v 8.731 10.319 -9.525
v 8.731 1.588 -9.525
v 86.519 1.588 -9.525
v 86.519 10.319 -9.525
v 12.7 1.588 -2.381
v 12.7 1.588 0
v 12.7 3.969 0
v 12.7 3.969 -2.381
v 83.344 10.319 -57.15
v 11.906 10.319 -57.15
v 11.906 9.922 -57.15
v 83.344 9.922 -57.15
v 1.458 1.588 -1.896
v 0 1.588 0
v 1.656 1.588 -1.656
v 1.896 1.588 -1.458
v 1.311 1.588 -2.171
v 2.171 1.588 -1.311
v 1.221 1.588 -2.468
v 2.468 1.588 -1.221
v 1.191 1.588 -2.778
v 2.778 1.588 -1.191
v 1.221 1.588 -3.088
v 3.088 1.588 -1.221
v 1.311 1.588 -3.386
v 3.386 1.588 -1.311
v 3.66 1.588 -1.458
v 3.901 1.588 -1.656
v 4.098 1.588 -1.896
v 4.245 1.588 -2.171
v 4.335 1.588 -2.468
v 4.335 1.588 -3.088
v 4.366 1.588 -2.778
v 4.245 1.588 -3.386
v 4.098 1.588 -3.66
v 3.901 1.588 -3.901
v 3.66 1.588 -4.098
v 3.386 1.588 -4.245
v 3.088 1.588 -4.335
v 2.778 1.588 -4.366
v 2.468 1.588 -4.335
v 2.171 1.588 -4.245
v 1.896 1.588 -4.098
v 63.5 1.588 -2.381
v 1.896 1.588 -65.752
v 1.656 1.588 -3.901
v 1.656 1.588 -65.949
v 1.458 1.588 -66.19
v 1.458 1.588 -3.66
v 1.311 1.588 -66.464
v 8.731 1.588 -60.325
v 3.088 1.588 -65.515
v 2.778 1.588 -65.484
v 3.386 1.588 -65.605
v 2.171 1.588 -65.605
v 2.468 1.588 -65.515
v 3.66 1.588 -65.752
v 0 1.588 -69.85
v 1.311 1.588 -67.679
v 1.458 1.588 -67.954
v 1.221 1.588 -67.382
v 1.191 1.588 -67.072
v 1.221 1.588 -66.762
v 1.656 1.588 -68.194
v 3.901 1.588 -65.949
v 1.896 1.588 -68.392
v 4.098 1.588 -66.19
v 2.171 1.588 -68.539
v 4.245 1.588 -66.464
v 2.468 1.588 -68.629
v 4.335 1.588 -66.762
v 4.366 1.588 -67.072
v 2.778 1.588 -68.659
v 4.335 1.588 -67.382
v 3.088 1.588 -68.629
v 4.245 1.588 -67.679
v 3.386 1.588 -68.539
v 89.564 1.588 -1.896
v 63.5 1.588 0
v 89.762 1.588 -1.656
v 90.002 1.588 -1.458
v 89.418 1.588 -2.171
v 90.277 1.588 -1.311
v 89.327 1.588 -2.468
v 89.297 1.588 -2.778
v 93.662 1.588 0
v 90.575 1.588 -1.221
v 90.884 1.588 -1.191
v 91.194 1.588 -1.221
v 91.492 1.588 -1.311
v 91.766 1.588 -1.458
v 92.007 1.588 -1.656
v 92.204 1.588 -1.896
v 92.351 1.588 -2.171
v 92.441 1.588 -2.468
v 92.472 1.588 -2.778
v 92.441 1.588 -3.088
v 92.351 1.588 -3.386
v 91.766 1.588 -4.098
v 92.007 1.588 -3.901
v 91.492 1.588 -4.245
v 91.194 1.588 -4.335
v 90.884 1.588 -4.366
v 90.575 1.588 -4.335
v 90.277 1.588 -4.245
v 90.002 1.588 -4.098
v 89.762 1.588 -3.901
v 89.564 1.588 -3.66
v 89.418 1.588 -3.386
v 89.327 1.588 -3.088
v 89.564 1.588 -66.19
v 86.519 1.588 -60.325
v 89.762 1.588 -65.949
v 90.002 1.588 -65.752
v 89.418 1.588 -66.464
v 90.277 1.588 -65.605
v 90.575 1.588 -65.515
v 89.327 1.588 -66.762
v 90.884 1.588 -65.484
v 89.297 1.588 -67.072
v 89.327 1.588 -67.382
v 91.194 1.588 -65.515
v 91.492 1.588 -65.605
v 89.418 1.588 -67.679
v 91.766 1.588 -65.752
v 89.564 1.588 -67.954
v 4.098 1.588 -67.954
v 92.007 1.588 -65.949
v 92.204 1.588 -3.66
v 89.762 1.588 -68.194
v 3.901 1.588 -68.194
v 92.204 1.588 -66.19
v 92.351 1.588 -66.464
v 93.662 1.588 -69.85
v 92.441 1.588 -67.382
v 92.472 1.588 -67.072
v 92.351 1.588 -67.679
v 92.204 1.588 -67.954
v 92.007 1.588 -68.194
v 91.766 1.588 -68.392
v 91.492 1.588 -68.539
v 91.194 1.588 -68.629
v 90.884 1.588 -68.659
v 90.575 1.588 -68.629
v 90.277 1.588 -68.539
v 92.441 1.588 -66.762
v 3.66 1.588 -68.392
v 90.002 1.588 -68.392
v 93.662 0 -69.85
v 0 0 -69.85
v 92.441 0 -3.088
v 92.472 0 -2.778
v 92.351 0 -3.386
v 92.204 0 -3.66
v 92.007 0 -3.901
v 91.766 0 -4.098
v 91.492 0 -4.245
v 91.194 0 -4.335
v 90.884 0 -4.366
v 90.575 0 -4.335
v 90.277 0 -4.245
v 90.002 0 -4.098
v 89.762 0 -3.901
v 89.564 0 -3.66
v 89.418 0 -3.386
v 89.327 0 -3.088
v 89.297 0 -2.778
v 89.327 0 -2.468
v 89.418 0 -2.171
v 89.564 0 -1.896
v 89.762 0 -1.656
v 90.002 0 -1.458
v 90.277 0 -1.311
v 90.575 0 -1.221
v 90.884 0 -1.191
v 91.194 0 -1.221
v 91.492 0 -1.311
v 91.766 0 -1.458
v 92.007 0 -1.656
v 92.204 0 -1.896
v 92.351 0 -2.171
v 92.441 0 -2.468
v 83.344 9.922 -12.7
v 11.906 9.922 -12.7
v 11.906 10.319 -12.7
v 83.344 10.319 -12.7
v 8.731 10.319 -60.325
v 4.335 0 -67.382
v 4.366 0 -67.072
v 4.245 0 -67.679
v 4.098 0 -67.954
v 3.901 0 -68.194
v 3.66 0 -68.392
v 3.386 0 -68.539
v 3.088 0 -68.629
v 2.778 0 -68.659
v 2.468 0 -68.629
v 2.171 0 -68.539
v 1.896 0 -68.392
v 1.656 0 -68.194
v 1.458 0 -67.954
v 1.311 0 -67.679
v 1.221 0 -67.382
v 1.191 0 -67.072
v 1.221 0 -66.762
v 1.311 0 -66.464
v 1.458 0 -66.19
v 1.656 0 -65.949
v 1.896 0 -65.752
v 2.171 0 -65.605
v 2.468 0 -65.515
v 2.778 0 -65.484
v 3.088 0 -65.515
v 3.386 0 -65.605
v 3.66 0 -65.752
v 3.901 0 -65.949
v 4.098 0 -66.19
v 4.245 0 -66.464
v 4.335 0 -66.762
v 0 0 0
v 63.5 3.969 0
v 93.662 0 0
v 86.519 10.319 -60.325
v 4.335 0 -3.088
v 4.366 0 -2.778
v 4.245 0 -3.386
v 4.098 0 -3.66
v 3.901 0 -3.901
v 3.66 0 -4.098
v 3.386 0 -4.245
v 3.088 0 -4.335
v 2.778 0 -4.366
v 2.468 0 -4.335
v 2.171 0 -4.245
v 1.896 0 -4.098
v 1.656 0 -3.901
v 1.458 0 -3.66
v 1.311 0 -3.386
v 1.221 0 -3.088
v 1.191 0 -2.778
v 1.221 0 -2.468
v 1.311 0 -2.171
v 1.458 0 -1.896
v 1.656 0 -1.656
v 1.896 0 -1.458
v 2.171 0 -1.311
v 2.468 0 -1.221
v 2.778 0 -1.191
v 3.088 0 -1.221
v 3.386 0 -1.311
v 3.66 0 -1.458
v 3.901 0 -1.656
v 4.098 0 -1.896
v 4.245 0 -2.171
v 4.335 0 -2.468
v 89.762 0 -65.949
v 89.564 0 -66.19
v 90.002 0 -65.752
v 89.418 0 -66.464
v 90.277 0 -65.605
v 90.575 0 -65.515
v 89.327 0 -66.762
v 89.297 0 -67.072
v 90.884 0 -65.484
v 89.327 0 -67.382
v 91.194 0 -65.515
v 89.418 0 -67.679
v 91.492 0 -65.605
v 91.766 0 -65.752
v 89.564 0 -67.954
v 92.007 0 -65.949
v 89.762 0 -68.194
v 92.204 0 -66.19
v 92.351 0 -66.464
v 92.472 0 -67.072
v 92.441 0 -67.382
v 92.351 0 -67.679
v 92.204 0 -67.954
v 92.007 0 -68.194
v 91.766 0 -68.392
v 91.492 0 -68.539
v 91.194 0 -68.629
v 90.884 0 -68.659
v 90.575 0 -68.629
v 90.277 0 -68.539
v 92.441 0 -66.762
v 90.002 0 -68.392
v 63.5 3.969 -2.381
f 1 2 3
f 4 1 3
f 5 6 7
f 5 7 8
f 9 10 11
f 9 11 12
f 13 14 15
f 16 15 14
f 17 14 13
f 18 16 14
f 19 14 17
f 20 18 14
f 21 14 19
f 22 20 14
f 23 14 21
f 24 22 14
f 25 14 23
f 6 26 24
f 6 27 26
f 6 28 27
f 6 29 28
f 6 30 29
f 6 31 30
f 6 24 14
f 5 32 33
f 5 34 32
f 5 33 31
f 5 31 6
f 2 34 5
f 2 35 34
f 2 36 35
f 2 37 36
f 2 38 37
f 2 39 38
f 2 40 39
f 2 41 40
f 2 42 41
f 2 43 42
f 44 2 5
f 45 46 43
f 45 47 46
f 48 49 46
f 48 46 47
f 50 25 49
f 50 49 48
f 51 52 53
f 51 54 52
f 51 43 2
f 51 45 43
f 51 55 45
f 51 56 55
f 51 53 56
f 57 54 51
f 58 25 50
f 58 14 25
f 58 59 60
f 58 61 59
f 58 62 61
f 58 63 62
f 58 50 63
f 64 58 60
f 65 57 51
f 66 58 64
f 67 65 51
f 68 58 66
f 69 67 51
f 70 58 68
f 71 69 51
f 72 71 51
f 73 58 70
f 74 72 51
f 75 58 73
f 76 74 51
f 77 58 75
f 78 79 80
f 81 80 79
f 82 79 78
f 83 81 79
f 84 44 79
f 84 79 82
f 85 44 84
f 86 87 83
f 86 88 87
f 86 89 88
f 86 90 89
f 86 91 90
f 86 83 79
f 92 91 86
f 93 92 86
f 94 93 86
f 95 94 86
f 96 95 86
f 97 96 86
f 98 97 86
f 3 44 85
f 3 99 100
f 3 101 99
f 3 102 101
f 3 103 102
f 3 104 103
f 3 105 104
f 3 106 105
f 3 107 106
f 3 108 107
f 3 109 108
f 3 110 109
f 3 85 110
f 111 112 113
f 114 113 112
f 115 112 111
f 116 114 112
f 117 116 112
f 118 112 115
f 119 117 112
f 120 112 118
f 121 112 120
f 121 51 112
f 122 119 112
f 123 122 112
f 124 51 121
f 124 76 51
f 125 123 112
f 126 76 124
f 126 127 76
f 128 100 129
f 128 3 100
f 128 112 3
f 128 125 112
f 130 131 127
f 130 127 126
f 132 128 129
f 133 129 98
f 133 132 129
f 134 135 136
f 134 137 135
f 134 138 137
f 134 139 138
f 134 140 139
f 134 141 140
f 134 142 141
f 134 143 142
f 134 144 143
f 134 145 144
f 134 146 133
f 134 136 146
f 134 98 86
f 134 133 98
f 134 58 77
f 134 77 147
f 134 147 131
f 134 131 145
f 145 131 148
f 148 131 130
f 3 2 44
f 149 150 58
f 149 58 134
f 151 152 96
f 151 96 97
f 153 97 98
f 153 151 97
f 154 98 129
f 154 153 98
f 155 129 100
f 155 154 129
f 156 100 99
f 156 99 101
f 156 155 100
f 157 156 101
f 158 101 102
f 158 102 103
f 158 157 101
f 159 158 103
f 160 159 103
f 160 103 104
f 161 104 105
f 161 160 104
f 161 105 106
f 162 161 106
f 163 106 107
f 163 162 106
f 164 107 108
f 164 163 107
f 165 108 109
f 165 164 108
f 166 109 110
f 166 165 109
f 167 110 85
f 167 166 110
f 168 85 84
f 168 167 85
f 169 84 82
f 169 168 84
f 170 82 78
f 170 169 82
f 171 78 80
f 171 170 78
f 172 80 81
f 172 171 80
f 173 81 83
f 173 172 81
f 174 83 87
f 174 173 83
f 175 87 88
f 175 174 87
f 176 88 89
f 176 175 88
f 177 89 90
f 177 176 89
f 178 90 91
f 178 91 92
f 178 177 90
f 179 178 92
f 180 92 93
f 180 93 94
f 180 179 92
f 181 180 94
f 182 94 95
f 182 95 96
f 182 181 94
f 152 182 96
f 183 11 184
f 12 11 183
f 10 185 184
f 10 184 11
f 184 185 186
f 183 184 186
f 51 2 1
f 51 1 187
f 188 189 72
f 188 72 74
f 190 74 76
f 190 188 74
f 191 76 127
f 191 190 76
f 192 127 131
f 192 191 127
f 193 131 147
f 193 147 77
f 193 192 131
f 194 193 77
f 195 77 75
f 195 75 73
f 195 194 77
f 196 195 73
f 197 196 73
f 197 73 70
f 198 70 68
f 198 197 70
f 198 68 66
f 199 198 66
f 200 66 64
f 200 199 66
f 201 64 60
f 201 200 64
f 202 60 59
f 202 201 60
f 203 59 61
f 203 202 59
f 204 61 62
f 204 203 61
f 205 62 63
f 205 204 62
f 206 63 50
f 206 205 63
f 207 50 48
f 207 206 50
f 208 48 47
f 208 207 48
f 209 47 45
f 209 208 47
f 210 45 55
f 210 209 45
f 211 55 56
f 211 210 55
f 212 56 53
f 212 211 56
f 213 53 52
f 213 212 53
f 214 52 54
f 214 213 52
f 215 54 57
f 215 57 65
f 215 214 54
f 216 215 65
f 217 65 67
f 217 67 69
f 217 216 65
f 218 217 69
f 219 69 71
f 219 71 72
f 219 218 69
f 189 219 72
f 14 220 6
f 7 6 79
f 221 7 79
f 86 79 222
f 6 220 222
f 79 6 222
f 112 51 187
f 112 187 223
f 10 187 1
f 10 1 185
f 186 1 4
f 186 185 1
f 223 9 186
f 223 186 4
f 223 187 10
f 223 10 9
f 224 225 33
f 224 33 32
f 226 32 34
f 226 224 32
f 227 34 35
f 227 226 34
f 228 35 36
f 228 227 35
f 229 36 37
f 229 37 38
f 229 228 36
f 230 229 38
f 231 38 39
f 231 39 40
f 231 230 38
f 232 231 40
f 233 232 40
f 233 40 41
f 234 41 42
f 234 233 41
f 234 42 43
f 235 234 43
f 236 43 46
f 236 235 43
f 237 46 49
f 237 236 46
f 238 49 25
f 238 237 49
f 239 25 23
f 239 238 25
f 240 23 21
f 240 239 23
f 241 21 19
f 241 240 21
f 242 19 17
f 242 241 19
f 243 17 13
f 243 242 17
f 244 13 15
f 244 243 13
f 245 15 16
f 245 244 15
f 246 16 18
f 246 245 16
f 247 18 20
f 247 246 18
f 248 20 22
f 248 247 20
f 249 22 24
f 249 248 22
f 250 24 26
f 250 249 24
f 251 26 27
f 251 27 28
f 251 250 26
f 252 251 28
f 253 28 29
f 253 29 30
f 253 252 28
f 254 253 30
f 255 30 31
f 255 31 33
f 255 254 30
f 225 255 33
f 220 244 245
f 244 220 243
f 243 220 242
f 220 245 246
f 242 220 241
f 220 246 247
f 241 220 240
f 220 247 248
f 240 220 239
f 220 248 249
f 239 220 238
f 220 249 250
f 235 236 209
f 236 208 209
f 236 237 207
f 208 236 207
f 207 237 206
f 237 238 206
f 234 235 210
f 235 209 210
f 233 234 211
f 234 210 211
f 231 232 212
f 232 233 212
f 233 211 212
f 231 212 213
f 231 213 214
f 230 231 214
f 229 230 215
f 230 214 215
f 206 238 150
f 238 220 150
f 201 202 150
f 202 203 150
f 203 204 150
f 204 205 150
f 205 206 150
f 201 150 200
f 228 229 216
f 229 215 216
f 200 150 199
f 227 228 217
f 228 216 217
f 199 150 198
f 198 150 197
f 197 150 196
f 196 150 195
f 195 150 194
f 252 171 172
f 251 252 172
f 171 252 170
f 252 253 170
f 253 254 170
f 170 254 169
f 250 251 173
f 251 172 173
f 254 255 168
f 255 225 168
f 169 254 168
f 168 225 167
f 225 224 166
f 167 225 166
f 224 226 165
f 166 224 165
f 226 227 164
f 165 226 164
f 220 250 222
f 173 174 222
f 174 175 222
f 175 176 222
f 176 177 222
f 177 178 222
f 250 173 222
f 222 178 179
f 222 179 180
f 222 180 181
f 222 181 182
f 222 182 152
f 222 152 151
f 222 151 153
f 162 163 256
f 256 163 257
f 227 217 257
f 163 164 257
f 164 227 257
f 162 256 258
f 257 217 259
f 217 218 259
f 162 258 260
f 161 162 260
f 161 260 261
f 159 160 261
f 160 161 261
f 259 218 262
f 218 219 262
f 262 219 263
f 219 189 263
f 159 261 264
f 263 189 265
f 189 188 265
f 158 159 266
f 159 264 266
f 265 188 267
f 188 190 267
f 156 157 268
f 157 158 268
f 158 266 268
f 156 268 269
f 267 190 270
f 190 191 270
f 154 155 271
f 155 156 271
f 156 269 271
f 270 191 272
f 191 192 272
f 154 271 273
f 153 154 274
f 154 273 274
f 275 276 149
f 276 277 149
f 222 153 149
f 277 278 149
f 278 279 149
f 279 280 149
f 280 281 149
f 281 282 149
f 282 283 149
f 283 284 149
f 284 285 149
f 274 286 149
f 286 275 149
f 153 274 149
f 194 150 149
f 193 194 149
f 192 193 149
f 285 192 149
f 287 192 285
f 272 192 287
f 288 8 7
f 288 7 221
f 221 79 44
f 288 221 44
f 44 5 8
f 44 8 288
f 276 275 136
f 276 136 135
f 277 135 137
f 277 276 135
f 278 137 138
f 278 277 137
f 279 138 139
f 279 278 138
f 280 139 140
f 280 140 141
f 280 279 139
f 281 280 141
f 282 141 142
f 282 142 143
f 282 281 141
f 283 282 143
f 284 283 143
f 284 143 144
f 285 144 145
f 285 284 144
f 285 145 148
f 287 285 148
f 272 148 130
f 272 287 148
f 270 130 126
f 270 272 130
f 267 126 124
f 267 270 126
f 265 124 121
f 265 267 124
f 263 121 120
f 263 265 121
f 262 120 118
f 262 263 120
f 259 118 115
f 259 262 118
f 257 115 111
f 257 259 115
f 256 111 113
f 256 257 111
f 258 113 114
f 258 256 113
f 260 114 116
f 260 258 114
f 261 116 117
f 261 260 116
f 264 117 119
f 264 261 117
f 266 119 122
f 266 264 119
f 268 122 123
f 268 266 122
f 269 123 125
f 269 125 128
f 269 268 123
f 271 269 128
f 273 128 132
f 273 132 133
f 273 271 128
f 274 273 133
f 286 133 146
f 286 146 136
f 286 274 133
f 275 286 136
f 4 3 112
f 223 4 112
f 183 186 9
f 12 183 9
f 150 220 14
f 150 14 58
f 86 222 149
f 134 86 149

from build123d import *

# Parameters (mm, degrees)
SKETCH1_W           = 93.6625
SKETCH1_H           = 69.85
SKETCH1_R           = 1.5875
BOSS_EXTRUDE1_DEPTH = 1.5875
SKETCH2_W           = 77.7875
SKETCH2_H           = 50.8
BOSS_EXTRUDE2_DEPTH = 8.73125
SKETCH3_W           = 50.8
SKETCH3_H           = 2.38125
BOSS_EXTRUDE3_DEPTH = 2.38125
SKETCH4_W           = 71.4375
SKETCH4_H           = 44.45
CUT_EXTRUDE1_DEPTH  = 0.396875


with BuildPart() as part:
    # Sketch1 → Boss-Extrude1 (new body)
    with BuildSketch(Plane(origin=(0, 0, 0), x_dir=(1, 0, 0), z_dir=(0, 1, 0))):
        with Locations((46.83125, 34.925)):
            Rectangle(SKETCH1_W, SKETCH1_H)
        with Locations((2.778125, 67.071875)):
            Circle(SKETCH1_R, mode=Mode.SUBTRACT)
        with Locations((90.884375, 67.071875)):
            Circle(SKETCH1_R, mode=Mode.SUBTRACT)
        with Locations((2.778125, 2.778125)):
            Circle(SKETCH1_R, mode=Mode.SUBTRACT)
        with Locations((90.884375, 2.778125)):
            Circle(SKETCH1_R, mode=Mode.SUBTRACT)
    extrude(amount=BOSS_EXTRUDE1_DEPTH)

    # Sketch2 → Boss-Extrude2 (add)
    with BuildSketch(Plane(origin=(0, 1.5875, 0), x_dir=(1, 0, 0), z_dir=(0, 1, 0))):
        with Locations((47.625, 34.925)):
            Rectangle(SKETCH2_W, SKETCH2_H)
    extrude(amount=BOSS_EXTRUDE2_DEPTH)

    # Sketch3 → Boss-Extrude3 (add)
    with BuildSketch(Plane(origin=(0, 1.5875, 0), x_dir=(1, 0, 0), z_dir=(0, 1, 0))):
        with Locations((38.1, 1.190625)):
            Rectangle(SKETCH3_W, SKETCH3_H)
    extrude(amount=BOSS_EXTRUDE3_DEPTH)

    # Sketch4 → Cut-Extrude1 (cut)
    with BuildSketch(Plane(origin=(0, 10.31875, 0), x_dir=(1, 0, 0), z_dir=(0, 1, 0))):
        with Locations((47.625, 34.925)):
            Rectangle(SKETCH4_W, SKETCH4_H)
    extrude(amount=-CUT_EXTRUDE1_DEPTH, mode=Mode.SUBTRACT)


solid = part.part
